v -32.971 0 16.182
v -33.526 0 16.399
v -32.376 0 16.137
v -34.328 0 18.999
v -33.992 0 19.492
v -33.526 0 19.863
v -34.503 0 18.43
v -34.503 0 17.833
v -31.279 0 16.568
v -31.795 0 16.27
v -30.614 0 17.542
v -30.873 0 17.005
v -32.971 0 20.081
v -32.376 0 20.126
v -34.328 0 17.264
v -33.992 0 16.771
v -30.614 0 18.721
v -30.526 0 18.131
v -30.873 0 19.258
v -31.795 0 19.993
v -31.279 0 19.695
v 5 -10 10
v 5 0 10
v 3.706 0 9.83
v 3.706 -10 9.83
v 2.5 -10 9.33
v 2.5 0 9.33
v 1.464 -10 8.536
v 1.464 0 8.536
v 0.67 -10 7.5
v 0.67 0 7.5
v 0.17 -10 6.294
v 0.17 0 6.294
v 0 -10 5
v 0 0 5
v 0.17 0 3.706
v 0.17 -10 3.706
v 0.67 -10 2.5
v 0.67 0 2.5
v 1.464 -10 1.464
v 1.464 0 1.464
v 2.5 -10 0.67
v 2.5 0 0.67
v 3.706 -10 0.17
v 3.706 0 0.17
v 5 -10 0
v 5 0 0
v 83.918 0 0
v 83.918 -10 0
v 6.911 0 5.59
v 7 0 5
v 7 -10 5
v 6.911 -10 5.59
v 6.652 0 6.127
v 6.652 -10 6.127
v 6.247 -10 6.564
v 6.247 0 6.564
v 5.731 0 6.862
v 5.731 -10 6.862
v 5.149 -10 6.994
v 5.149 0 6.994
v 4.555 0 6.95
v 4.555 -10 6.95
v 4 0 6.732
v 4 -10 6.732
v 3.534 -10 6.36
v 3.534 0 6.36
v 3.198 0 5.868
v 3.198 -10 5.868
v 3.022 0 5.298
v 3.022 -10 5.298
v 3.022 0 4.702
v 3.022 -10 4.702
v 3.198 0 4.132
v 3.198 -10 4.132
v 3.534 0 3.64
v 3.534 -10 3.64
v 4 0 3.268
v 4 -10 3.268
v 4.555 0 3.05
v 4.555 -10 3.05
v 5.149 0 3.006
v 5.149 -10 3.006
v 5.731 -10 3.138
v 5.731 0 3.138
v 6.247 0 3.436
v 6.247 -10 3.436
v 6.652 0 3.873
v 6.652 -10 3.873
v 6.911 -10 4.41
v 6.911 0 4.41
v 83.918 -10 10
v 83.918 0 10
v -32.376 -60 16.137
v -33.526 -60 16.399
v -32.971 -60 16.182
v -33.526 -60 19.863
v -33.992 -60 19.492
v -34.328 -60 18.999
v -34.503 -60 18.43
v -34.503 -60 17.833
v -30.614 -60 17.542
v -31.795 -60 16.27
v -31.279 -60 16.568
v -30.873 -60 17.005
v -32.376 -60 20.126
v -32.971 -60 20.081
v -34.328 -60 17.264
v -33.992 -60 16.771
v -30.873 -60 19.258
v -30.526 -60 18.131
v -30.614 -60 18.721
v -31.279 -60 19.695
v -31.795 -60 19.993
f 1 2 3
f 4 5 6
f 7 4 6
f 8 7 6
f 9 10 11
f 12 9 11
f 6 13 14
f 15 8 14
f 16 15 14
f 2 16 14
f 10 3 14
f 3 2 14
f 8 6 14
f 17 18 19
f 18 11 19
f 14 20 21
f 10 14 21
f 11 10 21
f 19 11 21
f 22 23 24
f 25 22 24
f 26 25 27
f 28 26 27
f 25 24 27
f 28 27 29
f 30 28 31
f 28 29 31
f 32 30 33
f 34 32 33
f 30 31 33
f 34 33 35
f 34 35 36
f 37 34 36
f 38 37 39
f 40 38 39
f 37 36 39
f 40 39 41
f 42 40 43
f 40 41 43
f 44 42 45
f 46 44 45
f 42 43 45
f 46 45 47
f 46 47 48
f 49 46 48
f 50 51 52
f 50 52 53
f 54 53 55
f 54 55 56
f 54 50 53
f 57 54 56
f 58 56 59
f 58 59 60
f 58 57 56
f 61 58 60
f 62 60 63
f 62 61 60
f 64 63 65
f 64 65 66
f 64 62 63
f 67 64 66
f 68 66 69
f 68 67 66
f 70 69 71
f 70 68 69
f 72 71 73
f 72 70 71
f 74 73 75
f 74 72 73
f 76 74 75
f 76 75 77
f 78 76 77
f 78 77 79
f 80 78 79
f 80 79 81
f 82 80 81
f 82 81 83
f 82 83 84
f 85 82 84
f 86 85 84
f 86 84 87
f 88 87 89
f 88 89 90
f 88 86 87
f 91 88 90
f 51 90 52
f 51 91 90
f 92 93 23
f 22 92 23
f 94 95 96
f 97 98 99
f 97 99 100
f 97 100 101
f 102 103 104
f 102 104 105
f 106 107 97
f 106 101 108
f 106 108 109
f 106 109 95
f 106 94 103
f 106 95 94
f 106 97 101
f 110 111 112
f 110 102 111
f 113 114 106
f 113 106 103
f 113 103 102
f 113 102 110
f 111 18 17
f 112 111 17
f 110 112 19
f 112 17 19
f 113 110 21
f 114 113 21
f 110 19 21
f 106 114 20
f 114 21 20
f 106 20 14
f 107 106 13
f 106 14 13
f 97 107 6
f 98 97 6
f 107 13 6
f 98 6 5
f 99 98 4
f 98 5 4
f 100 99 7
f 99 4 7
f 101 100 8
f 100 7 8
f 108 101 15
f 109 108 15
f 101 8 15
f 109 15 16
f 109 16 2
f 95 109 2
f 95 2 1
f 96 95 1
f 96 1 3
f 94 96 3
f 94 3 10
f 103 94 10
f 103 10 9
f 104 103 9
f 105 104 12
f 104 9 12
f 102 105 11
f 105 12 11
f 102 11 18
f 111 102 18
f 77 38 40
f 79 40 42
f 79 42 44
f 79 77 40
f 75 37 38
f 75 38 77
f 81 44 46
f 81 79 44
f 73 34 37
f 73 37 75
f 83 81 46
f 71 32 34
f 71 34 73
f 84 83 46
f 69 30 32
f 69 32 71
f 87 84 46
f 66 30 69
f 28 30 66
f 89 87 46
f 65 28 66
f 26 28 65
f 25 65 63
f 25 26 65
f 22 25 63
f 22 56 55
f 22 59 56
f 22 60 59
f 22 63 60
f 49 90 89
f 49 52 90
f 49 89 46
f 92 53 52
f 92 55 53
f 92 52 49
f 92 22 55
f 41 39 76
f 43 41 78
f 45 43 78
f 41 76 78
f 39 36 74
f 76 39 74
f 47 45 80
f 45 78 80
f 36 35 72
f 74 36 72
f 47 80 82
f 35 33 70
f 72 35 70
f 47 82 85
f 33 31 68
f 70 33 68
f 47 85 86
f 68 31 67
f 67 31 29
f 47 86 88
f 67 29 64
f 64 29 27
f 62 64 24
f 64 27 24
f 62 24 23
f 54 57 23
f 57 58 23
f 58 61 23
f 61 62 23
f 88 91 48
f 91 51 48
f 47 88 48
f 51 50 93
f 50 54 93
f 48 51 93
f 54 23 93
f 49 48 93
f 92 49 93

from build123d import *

# Parameters (mm, degrees)
F0_R     = 2
F1_DEPTH = 10
F2_R     = 2
F3_DEPTH = 60


with BuildPart() as f1:
    # F0 (on Front) → F1 (new body)
    with BuildSketch(Plane.XZ):
        with BuildLine():
            ThreePointArc((0, 5), (1.464466, 1.464466), (5, 0))
            Line((5, 0), (83.917933, 0))
            Line((83.917933, 0), (83.917933, 10))
            Line((83.917933, 10), (5, 10))
            ThreePointArc((5, 10), (1.464466, 8.535534), (0, 5))
        make_face()
        with Locations((5, 5)):
            Circle(F0_R, mode=Mode.SUBTRACT)
    extrude(amount=F1_DEPTH)


with BuildPart() as f3:
    # F2 (on Front) → F3 (new body)
    with BuildSketch(Plane.XZ):
        with Locations((-32.525573, 18.131444)):
            Circle(F2_R)
    extrude(amount=F3_DEPTH)


solid = Compound([f1.part, f3.part])
